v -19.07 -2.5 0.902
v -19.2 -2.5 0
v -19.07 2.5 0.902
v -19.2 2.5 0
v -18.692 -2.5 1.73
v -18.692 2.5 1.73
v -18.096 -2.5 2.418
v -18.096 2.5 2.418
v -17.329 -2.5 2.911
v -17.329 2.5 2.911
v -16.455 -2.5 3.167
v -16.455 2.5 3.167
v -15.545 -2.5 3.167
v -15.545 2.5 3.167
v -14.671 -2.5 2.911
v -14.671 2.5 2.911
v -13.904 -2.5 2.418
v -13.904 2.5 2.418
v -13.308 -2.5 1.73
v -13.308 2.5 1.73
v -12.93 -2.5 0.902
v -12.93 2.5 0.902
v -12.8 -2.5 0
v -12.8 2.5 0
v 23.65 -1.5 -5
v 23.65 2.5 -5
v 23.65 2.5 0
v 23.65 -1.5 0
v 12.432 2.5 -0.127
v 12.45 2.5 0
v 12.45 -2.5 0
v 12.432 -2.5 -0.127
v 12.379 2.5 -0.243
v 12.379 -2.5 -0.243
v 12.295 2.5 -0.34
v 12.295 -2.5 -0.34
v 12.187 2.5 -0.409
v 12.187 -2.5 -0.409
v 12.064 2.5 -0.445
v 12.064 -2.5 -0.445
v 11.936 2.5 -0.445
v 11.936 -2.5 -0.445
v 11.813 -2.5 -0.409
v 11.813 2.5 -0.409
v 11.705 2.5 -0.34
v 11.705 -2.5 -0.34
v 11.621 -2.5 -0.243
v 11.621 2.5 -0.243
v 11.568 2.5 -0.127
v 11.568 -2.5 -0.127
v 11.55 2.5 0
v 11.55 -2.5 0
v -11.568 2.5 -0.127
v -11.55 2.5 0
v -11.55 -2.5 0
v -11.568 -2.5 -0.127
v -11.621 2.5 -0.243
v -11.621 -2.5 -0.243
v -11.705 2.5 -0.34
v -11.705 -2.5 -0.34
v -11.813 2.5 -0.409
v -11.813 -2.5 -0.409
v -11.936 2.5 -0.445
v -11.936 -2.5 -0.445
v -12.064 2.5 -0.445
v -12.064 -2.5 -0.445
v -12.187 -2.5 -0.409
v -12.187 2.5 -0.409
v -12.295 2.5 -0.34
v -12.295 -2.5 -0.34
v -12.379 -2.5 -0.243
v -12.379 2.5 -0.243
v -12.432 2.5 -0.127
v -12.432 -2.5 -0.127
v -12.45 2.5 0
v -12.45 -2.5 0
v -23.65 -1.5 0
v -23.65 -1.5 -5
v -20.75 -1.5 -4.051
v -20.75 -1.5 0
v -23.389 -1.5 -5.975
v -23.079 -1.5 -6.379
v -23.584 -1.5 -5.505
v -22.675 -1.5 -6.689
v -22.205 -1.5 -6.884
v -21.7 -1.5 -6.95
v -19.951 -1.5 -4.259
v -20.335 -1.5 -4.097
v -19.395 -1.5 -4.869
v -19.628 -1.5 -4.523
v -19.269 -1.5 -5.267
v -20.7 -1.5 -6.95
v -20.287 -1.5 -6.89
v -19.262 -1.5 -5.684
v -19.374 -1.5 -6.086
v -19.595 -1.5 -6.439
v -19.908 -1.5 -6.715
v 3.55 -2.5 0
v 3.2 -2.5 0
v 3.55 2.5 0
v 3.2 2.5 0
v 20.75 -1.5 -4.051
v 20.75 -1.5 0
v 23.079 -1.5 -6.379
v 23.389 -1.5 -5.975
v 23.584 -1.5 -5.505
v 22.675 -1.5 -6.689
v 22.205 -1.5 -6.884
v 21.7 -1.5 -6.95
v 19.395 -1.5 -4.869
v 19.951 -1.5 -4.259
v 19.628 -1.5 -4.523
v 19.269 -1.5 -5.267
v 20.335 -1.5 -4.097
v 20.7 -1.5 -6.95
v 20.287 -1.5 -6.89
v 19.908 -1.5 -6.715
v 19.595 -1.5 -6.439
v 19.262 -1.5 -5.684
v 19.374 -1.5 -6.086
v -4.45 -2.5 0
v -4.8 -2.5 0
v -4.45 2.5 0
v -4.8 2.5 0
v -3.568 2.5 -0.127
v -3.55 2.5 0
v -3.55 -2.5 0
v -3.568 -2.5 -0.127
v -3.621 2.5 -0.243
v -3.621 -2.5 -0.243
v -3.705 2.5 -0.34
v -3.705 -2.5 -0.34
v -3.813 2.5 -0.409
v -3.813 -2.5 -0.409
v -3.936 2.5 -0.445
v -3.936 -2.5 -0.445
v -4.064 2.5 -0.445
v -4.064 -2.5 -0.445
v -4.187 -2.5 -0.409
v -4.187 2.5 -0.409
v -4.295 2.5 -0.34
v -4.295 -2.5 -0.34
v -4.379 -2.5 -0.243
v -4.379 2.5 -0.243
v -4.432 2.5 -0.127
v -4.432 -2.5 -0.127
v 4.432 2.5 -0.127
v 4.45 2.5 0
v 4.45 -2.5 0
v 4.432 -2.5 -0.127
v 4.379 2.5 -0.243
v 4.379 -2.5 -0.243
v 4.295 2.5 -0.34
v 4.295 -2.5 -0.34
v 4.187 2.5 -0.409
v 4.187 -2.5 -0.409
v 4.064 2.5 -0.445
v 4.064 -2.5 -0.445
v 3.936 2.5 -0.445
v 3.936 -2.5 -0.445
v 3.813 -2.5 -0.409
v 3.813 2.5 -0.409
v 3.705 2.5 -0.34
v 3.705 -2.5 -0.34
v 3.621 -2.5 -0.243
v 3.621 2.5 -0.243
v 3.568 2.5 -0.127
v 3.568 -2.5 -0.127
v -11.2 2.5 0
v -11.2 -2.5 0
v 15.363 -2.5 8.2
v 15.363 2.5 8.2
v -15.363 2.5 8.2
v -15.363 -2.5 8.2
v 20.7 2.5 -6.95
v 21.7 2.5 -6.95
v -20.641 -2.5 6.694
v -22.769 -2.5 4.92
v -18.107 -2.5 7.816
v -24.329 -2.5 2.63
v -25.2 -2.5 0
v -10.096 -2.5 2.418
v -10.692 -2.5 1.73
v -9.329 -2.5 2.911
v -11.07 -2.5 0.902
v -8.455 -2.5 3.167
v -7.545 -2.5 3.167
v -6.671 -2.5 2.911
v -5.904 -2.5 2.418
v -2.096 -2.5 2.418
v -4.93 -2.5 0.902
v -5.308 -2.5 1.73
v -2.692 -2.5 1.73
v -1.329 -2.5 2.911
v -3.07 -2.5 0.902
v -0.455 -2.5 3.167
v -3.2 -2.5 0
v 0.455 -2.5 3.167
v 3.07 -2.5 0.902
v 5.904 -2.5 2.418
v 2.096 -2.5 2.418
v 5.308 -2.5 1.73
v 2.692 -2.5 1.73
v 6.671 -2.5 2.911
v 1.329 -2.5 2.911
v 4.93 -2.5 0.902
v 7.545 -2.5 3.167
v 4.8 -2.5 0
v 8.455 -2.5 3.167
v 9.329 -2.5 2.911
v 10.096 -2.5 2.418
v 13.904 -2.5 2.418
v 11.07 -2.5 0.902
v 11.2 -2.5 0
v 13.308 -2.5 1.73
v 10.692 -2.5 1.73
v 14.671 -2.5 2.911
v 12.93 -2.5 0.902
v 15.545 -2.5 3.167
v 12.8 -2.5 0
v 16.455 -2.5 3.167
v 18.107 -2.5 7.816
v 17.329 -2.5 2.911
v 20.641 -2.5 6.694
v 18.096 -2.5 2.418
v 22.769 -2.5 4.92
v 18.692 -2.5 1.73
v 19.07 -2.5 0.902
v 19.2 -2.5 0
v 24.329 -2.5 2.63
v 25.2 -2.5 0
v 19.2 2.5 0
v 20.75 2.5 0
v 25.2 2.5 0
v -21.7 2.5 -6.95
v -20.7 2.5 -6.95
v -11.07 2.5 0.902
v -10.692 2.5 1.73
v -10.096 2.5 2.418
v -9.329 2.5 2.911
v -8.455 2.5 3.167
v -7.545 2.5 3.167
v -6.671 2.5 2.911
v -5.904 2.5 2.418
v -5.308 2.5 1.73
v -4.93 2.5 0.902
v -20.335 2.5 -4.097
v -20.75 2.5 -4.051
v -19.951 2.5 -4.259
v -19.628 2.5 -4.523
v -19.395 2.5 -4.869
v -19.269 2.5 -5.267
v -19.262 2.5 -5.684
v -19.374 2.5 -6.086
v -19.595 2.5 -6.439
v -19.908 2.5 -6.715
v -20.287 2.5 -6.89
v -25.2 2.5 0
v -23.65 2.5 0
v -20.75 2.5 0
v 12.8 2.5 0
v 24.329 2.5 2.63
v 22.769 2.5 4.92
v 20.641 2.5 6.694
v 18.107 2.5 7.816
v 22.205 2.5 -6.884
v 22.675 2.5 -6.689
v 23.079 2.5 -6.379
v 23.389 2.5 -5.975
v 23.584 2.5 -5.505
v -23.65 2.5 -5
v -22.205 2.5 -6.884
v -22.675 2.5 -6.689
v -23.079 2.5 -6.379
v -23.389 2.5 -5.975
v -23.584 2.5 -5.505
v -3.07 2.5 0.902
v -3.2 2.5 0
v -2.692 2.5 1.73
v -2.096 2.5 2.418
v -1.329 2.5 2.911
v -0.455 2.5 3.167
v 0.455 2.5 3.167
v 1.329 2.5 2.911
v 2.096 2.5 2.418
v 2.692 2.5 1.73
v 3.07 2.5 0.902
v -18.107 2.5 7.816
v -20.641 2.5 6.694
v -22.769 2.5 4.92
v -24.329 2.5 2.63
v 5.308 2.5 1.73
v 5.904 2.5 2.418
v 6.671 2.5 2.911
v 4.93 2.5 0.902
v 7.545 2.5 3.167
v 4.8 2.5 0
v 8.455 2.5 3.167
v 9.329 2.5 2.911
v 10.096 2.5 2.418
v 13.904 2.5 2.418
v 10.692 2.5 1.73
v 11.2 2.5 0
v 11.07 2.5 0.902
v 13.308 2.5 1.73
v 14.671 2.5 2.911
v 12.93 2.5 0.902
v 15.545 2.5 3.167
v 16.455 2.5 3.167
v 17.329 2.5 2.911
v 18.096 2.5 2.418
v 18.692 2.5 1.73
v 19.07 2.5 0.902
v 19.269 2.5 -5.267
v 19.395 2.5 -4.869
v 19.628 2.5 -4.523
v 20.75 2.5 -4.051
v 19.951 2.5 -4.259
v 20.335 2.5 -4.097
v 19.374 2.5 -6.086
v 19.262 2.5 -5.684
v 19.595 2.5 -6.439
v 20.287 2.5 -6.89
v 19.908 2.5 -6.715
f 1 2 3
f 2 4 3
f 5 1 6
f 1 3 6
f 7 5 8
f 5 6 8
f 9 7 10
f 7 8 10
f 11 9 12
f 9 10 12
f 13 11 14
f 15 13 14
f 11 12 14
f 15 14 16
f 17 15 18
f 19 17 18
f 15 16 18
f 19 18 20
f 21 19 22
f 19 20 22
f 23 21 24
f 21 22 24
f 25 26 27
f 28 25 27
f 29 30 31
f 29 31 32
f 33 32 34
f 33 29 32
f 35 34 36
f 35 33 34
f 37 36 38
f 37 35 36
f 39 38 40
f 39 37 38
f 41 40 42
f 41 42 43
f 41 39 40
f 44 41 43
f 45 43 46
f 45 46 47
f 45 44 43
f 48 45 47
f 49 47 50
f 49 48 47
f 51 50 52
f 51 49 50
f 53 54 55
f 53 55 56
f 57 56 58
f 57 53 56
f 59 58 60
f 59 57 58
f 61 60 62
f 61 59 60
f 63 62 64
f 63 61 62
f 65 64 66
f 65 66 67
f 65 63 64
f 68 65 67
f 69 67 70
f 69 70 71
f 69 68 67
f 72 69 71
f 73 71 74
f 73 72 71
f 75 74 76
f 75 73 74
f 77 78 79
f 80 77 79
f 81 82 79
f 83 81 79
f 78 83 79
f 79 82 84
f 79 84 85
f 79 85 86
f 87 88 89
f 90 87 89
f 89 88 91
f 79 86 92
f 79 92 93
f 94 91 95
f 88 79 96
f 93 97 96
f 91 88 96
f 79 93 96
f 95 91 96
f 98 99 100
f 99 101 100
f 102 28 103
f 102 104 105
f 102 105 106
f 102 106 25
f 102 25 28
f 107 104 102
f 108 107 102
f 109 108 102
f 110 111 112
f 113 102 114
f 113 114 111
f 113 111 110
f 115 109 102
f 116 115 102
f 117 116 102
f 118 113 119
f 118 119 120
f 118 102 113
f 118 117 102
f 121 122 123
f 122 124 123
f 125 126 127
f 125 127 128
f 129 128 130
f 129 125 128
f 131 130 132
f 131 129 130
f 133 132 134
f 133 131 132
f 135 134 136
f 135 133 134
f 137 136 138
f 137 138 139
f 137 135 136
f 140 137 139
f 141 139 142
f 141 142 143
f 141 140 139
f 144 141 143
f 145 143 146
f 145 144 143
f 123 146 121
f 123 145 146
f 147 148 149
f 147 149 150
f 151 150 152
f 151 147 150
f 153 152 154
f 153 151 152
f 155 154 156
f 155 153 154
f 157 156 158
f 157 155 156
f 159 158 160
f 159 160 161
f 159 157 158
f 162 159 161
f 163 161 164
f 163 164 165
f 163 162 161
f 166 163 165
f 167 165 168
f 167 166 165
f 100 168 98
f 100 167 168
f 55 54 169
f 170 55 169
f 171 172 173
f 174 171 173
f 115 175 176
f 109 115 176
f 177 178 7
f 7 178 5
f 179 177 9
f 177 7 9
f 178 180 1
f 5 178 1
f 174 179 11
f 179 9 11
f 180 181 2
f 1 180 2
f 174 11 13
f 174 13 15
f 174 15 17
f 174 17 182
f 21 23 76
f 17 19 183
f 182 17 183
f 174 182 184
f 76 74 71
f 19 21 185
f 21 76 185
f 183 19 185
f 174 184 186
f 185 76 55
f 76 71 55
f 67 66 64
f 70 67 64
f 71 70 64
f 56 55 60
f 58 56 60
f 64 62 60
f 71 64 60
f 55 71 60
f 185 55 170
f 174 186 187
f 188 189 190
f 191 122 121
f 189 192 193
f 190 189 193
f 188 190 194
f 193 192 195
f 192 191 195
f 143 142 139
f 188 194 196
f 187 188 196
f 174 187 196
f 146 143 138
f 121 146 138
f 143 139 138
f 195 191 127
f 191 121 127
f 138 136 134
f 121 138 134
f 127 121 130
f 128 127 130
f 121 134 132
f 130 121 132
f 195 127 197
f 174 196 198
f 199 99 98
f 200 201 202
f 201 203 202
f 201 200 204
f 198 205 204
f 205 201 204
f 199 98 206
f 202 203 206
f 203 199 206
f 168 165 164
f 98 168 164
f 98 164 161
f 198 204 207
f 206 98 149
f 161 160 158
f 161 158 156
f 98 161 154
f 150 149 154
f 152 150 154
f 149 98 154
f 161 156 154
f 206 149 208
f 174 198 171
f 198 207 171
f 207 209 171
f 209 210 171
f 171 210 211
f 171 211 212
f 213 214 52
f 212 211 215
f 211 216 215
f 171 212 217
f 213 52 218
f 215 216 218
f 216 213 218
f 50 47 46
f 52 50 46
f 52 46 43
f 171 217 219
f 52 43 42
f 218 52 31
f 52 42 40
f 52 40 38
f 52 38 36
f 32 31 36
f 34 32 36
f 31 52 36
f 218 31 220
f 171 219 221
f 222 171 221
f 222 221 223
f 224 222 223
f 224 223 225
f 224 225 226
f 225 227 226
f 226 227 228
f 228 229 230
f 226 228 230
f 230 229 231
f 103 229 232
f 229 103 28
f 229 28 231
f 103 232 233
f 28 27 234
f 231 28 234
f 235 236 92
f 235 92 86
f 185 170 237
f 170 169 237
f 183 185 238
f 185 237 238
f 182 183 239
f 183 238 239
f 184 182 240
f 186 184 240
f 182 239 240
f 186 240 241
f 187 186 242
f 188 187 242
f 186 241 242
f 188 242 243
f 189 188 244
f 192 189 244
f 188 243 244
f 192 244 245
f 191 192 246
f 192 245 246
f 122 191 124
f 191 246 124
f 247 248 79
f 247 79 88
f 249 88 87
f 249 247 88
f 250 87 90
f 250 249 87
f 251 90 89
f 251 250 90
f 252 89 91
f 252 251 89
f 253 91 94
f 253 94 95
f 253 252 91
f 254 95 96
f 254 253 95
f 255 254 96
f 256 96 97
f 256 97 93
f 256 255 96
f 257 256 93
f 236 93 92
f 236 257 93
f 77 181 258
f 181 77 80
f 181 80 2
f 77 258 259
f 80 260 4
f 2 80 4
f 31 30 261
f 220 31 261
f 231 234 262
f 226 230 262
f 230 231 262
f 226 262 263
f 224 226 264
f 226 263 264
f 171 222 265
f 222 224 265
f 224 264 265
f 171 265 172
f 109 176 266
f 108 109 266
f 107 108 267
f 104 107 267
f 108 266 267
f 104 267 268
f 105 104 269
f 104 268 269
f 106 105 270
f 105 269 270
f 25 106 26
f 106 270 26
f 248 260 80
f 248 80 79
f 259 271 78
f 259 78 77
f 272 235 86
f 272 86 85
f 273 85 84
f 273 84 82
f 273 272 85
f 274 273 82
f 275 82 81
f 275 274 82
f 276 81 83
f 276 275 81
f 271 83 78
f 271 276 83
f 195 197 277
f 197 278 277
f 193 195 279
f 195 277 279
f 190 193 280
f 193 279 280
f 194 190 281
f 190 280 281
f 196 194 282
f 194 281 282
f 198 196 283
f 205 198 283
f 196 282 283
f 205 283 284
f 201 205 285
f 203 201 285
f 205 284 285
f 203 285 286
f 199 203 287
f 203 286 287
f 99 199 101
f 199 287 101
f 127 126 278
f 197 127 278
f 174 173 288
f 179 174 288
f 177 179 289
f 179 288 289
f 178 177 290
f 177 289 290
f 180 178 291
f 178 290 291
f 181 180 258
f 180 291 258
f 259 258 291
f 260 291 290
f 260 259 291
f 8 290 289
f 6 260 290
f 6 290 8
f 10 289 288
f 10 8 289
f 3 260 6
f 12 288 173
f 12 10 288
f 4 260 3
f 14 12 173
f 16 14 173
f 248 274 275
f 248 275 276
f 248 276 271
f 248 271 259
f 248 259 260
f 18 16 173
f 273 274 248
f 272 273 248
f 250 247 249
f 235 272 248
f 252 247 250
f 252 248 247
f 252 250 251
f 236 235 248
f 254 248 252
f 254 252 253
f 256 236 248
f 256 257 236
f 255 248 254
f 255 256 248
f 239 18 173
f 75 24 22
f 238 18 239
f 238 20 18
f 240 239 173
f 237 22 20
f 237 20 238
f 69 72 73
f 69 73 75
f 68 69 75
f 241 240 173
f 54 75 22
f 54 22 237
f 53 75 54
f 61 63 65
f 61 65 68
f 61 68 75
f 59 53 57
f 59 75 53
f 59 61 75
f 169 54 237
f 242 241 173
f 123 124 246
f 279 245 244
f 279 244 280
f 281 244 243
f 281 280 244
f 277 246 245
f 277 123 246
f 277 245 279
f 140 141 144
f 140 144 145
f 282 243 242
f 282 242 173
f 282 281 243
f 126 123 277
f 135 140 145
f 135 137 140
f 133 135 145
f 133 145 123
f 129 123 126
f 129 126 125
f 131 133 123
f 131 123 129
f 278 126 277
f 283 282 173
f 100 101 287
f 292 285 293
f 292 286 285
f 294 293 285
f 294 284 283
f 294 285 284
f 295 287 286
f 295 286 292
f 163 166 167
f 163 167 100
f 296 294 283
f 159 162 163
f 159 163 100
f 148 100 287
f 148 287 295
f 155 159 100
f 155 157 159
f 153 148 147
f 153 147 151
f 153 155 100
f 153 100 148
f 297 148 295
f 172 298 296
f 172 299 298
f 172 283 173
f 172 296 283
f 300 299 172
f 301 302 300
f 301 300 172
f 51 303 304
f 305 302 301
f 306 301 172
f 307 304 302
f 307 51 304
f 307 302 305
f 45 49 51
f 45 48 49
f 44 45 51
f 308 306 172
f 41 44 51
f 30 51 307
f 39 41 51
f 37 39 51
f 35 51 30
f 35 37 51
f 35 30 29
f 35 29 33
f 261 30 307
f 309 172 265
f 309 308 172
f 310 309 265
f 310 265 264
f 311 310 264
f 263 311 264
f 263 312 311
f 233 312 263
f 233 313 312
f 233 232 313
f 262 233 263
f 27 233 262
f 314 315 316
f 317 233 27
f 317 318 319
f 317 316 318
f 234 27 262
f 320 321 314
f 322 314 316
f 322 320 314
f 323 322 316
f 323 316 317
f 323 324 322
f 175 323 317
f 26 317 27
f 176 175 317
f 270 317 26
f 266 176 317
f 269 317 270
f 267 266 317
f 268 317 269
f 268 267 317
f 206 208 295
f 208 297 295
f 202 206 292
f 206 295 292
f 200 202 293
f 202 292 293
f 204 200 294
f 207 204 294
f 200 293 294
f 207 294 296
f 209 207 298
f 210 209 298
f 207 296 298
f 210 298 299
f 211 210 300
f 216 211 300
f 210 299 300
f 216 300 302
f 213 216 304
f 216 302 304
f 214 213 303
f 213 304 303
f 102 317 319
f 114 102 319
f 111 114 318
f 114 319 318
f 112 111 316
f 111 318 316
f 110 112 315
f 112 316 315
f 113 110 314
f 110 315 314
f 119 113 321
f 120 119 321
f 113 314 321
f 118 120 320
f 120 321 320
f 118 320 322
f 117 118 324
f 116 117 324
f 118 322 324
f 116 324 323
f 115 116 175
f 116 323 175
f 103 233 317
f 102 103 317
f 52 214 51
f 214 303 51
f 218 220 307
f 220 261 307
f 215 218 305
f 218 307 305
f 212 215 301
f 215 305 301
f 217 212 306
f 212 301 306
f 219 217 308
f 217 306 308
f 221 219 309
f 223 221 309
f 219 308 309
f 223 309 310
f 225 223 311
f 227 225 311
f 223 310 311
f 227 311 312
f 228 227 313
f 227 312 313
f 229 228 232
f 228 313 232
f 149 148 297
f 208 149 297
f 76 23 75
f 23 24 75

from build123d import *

# Parameters (mm, degrees)
RESSALTO_EXTRUS_O1_DEPTH = 2.5
RESSALTO_EXTRUS_O2_DEPTH = 4
FILETE1_R                = 10
ESBO_O2_R                = 0.45
RESSALTO_EXTRUS_O3_DEPTH = 5


with BuildPart() as part:
    # Esboço1 → Ressalto-extrusão1 (new, symmetric)
    with BuildSketch(Plane(origin=(0, 0, 0), x_dir=(1, 0, 0), z_dir=(0, 1, 0))):
        with BuildLine():
            Line((-25.2, 0), (-19.2, 0))
            ThreePointArc((-19.2, 0), (-16, -3.2), (-12.8, 0))
            Line((-12.8, 0), (-11.2, 0))
            ThreePointArc((-11.2, 0), (-8, -3.2), (-4.8, 0))
            Line((-4.8, 0), (-3.2, 0))
            ThreePointArc((-3.2, 0), (0, -3.2), (3.2, 0))
            Line((3.2, 0), (4.8, 0))
            ThreePointArc((4.8, 0), (8, -3.2), (11.2, 0))
            Line((11.2, 0), (12.8, 0))
            ThreePointArc((12.8, 0), (16, -3.2), (19.2, 0))
            Line((19.2, 0), (25.2, 0))
            Line((25.2, 0), (25.2, -8.2))
            Line((25.2, -8.2), (-25.2, -8.2))
            Line((-25.2, -8.2), (-25.2, 0))
        make_face()
    extrude(amount=RESSALTO_EXTRUS_O1_DEPTH, both=True)

    # Esboço3 → Ressalto-extrusão2 (add)
    with BuildSketch(Plane(origin=(0, 2.5, 0), x_dir=(1, 0, 0), z_dir=(0, 1, 0))):
        with BuildLine():
            Line((-23.65, 5), (-23.65, 0))
            Line((-23.65, 0), (-20.75, 0))
            Line((-20.75, 0), (-20.75, 4.050862325))
            ThreePointArc((-20.75, 4.050862325), (-19.250215597, 5.474996282), (-20.7, 6.95))
            Line((-20.7, 6.95), (-21.7, 6.95))
            ThreePointArc((-21.7, 6.95), (-23.078858223, 6.378858223), (-23.65, 5))
        make_face()
        with BuildLine():
            Line((23.65, 0), (20.75, 0))
            Line((20.75, 0), (20.75, 4.050862325))
            ThreePointArc((20.75, 4.050862325), (19.250215597, 5.474996282), (20.7, 6.95))
            Line((20.7, 6.95), (21.7, 6.95))
            ThreePointArc((21.7, 6.95), (23.078858223, 6.378858223), (23.65, 5))
            Line((23.65, 5), (23.65, 0))
        make_face()
    extrude(amount=-RESSALTO_EXTRUS_O2_DEPTH)

    # Filete1
    # the kernel refuses this fillet: 10 mm, written as the material it takes off along each edge
    with BuildSketch(Plane(origin=(-25.2, 27.091665255, 8.2), x_dir=(1, 0, 0), z_dir=(0, -1, 0))) as filete1_piece_1:
        with BuildLine():
            CenterArc((9.836666102, -10), FILETE1_R, 90, 79.630240195)
            Line((0, -8.2), (-0.196733322, -8.164))
            ThreePointArc((-0.196733322, -8.164), (-0.2, -4.1), (-0.2, 0))
            Line((-0.2, 0), (0, 0.2))
            Line((0, 0.2), (9.836666102, 0.2))
            Line((9.836666102, 0.2), (9.836666102, 0))
        make_face()
    extrude(amount=54.183330509, mode=Mode.SUBTRACT)
    with BuildSketch(Plane(origin=(25.2, 27.091665255, 8.2), x_dir=(0, 0, -1), z_dir=(0, -1, 0))) as filete1_piece_2:
        with BuildLine():
            CenterArc((10, -9.836666102), FILETE1_R, 100.369759805, 79.630240195)
            Line((0, -9.836666102), (-0.2, -9.836666102))
            Line((-0.2, -9.836666102), (-0.2, 0))
            Line((-0.2, 0), (0, 0.2))
            ThreePointArc((0, 0.2), (4.1, 0.2), (8.164, 0.196733322))
            Line((8.164, 0.196733322), (8.2, 0))
        make_face()
    extrude(amount=54.183330509, mode=Mode.SUBTRACT)

    # Esboço2 → Ressalto-extrusão3 (add, through all)
    with BuildSketch(Plane(origin=(0, 2.5, 0), x_dir=(1, 0, 0), z_dir=(0, 1, 0))):
        with Locations((-12, 0)):
            Circle(ESBO_O2_R)
        with Locations((-4, 0)):
            Circle(ESBO_O2_R)
        with Locations((4, 0)):
            Circle(ESBO_O2_R)
        with Locations((12, 0)):
            Circle(ESBO_O2_R)
    extrude(amount=-RESSALTO_EXTRUS_O3_DEPTH)


solid = part.part
